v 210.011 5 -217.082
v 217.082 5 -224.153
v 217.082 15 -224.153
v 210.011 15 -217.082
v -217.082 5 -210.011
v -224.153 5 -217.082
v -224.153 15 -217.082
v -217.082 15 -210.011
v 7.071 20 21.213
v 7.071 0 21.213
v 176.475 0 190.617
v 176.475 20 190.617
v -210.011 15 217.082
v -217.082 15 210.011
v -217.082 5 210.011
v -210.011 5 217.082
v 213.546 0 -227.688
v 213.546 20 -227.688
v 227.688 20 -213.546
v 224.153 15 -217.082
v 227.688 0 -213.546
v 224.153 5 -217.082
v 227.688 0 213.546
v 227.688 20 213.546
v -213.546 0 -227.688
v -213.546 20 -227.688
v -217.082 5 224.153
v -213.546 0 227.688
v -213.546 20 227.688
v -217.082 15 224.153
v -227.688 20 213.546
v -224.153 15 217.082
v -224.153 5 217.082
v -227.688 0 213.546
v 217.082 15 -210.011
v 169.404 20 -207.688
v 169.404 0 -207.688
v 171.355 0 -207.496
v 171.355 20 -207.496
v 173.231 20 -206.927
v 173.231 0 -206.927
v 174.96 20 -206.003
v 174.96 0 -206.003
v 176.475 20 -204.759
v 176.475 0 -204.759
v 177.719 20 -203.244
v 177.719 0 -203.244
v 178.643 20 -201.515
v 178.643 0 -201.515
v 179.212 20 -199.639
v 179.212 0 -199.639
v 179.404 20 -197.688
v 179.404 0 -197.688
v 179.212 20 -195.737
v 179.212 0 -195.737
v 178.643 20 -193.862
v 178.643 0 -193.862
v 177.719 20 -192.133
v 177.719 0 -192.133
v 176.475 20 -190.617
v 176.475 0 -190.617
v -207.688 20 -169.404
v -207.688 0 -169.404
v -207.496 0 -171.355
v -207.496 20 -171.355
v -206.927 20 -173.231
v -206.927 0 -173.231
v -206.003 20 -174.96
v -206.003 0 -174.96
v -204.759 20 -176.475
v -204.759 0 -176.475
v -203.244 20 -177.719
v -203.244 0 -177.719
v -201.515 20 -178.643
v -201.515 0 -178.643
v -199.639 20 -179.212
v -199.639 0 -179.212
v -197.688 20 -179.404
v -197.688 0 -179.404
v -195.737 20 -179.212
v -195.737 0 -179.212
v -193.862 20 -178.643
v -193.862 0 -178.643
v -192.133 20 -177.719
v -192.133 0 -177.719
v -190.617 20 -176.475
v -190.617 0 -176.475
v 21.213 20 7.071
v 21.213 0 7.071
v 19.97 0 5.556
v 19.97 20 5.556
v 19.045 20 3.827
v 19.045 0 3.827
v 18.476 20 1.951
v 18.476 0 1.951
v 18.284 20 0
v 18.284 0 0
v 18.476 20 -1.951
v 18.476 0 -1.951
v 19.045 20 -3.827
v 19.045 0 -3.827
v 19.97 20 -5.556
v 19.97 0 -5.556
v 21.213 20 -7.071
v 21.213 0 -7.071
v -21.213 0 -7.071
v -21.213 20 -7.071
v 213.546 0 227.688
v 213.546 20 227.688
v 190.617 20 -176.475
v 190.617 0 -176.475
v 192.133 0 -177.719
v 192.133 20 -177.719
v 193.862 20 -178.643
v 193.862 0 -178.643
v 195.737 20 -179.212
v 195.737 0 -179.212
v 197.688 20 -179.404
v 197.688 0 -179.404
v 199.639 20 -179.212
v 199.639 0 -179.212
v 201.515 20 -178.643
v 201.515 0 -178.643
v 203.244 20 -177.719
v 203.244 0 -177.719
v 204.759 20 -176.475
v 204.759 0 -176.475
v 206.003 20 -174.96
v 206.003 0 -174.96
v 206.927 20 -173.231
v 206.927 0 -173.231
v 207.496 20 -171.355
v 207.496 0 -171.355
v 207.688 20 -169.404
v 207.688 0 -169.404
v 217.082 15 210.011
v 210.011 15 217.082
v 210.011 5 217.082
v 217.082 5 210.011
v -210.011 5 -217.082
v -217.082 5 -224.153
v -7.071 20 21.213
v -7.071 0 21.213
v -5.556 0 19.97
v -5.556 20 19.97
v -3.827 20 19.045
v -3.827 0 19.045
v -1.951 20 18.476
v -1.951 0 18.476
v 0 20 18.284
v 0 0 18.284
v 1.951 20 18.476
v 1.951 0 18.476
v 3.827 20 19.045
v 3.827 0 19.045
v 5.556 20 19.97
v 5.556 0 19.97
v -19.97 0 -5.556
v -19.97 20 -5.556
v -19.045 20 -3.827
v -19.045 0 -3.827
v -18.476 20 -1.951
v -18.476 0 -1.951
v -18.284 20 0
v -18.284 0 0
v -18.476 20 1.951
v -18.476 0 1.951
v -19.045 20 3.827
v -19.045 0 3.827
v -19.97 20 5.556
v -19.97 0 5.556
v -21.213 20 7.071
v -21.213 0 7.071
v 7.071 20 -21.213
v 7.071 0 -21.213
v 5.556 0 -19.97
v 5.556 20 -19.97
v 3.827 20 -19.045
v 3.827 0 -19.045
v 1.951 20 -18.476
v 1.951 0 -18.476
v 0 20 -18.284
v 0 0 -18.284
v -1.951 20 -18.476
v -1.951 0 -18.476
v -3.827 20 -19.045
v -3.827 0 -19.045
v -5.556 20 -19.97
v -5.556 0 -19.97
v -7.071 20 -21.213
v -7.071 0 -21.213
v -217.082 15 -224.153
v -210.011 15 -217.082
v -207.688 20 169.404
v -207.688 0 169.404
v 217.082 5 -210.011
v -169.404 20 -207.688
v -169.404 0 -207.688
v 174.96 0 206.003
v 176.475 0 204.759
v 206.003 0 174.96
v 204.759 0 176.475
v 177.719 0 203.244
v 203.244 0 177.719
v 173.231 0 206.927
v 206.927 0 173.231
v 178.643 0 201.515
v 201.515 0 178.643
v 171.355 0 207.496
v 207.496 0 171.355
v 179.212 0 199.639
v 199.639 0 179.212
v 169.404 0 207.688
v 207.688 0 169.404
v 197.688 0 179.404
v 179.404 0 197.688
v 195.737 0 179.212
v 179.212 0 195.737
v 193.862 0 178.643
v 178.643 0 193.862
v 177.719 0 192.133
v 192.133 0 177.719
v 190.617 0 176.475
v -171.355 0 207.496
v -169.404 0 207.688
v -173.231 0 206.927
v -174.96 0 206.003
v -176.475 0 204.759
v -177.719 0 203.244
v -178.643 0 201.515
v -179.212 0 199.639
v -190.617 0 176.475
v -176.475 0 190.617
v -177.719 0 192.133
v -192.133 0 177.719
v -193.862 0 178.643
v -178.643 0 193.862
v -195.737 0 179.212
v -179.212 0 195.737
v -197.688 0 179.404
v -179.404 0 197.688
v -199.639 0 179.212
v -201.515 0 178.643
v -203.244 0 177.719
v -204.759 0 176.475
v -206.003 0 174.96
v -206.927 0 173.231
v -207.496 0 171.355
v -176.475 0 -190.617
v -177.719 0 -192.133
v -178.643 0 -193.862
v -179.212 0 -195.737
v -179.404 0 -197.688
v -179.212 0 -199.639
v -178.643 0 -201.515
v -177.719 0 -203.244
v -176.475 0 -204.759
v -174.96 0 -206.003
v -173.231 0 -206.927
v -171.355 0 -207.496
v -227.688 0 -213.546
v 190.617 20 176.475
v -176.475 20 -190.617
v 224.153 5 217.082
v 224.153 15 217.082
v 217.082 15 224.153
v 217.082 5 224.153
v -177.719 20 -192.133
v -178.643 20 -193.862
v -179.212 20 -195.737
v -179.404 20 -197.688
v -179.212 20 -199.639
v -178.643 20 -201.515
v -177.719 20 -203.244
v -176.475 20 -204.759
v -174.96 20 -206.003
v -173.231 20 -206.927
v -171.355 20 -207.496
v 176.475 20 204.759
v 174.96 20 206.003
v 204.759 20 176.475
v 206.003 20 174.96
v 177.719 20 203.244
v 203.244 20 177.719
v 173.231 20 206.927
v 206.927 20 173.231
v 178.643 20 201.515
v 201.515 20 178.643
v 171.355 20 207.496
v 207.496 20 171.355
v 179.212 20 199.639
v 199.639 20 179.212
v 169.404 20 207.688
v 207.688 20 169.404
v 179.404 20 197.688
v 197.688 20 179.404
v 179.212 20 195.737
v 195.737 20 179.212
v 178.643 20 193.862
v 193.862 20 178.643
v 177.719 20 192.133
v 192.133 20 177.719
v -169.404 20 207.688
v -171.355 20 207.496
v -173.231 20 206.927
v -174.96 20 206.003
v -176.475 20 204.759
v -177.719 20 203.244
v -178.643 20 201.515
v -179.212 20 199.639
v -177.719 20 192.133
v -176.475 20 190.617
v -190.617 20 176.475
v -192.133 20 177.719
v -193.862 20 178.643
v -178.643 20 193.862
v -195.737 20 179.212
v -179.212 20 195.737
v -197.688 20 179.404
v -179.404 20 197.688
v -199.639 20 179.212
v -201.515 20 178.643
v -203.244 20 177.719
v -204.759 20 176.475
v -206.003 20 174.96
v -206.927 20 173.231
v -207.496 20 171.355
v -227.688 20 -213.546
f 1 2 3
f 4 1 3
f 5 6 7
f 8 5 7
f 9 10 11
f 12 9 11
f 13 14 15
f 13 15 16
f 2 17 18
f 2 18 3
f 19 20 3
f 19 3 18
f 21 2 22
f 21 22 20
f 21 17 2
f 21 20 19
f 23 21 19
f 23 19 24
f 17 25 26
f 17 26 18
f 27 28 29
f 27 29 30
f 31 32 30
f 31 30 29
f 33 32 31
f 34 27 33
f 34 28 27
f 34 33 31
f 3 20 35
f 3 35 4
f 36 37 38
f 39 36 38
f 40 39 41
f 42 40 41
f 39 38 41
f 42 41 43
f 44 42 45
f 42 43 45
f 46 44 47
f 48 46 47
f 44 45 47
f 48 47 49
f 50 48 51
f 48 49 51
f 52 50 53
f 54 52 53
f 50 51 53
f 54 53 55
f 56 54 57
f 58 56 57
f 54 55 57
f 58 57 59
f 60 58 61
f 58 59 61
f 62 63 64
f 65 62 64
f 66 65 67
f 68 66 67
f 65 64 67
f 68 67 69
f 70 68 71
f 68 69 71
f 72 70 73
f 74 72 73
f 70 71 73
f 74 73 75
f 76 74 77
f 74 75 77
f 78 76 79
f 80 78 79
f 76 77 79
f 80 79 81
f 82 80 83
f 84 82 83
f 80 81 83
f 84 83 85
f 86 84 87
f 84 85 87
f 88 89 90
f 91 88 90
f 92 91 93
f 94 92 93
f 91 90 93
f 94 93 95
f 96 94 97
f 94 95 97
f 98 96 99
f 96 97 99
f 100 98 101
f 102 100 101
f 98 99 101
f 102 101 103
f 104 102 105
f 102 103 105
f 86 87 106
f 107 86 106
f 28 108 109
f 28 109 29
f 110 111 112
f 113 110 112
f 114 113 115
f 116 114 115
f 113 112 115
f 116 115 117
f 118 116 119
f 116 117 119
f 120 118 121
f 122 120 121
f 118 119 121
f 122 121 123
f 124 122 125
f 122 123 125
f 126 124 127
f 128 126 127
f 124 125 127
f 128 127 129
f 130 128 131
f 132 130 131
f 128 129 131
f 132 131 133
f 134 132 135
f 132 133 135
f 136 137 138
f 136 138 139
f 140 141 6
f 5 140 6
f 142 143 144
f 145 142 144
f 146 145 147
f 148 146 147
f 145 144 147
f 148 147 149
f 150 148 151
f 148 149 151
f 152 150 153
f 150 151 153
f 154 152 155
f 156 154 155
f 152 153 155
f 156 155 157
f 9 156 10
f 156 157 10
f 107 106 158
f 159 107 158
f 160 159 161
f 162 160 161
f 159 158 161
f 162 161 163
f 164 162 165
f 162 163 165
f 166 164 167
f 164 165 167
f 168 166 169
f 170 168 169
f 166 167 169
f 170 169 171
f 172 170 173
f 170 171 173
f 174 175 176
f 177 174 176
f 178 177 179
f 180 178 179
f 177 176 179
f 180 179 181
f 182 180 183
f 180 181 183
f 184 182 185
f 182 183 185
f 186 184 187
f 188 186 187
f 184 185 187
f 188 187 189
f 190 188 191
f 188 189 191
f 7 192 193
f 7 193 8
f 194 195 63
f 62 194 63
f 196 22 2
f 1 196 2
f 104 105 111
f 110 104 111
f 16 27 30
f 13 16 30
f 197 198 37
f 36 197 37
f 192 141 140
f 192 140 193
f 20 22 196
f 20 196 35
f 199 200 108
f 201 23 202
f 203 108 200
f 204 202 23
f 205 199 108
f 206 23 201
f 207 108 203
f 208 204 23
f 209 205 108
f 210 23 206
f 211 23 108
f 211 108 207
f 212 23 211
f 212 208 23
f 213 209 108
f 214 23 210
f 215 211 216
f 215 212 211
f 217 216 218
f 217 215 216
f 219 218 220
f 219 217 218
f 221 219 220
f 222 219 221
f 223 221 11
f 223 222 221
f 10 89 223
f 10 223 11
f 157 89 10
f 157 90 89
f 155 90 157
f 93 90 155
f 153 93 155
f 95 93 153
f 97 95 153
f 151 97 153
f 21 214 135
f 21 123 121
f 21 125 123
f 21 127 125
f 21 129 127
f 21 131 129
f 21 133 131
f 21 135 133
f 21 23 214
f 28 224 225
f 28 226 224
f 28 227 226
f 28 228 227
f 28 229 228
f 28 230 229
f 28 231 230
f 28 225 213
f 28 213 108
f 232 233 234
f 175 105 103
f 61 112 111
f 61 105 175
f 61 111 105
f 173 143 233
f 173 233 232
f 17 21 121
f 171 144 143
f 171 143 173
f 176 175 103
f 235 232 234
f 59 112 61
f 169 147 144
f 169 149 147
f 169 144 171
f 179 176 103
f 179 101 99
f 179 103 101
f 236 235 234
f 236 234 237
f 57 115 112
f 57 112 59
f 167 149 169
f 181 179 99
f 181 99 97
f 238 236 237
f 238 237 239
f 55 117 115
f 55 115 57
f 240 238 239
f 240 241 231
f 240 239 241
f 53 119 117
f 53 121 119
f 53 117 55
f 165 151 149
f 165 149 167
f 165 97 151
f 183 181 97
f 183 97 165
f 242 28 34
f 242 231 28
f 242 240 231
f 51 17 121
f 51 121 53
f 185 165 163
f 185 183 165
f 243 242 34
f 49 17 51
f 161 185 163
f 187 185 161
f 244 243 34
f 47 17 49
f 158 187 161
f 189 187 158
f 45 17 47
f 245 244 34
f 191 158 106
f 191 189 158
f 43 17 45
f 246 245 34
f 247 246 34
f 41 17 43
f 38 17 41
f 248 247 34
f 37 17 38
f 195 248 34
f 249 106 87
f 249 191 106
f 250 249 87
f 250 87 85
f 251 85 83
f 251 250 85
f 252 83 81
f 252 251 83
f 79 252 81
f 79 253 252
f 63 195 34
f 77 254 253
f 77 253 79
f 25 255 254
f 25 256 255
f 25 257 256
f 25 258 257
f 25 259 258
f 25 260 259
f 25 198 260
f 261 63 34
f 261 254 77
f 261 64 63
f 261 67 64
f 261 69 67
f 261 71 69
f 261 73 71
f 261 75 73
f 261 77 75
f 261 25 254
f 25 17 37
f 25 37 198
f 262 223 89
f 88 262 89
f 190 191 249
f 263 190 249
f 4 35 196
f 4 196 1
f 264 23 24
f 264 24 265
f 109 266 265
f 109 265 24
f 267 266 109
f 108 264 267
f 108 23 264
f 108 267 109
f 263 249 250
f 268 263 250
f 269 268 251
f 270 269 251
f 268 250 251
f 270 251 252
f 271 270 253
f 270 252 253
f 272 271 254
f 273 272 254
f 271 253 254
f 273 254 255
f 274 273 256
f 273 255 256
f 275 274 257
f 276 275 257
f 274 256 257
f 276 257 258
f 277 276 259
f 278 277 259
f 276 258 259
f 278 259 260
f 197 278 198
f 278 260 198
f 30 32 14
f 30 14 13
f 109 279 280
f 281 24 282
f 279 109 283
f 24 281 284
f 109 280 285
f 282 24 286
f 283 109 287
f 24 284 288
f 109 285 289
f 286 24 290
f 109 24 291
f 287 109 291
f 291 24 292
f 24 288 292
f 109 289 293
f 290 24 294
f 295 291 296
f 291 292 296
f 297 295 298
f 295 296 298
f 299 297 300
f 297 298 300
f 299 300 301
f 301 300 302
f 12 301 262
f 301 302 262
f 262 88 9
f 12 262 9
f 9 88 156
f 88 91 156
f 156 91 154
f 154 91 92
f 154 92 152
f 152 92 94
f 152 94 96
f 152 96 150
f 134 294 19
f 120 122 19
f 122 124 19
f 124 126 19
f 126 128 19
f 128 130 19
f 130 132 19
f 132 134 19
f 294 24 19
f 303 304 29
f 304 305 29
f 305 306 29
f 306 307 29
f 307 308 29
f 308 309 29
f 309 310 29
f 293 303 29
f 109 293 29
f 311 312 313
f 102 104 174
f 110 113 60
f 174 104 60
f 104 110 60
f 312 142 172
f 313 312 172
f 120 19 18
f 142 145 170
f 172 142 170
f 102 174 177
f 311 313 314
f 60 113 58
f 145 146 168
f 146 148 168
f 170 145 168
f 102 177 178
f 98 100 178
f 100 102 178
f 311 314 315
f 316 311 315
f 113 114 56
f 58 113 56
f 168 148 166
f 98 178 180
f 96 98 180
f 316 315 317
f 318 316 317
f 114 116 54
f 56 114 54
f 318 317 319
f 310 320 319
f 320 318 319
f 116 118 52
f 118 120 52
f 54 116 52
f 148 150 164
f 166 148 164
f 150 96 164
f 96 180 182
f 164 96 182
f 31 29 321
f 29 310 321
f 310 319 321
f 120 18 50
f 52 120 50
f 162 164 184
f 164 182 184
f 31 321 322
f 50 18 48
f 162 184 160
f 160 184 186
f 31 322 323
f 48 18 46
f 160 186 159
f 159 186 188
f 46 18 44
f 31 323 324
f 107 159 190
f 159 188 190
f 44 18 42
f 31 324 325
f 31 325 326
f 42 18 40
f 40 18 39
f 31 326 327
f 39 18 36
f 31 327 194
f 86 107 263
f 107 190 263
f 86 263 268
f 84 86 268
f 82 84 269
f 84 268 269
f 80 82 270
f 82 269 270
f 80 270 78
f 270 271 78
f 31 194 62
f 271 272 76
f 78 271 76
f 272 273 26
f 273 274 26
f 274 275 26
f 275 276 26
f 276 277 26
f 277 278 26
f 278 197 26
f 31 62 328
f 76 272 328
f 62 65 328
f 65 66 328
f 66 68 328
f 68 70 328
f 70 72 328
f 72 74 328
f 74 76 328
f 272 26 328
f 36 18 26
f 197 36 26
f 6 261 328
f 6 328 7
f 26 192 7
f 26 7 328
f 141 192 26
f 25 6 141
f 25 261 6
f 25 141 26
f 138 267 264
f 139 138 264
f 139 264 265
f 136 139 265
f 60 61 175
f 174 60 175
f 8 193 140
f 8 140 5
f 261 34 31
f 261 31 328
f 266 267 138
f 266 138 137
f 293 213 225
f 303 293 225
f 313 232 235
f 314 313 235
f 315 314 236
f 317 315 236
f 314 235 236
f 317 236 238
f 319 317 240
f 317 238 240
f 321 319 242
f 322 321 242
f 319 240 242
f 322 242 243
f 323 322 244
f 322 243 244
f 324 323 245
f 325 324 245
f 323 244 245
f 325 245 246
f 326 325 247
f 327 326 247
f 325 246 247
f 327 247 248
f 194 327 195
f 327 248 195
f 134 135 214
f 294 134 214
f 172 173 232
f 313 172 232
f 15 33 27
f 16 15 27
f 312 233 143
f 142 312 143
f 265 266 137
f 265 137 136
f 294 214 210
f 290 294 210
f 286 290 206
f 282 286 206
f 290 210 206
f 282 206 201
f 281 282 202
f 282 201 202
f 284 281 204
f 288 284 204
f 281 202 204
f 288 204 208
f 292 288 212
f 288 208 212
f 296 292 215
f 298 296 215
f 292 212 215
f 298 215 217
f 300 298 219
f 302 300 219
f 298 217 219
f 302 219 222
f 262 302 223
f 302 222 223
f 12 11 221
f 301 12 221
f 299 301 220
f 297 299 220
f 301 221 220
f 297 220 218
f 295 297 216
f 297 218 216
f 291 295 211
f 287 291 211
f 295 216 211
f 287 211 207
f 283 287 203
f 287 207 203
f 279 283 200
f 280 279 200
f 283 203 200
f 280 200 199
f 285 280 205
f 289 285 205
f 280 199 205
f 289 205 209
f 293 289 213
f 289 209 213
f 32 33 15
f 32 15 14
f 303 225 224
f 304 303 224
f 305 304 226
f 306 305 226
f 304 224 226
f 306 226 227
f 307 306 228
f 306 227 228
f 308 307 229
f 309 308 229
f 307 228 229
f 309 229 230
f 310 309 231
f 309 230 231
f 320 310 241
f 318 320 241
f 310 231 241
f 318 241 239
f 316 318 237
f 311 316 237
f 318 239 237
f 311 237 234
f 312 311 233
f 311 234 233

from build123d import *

# Parameters (mm, degrees)
BOSS_EXTRUDE1_DEPTH = 20
SKETCH3_W           = 10
SKETCH3_H           = 10
CUT_EXTRUDE1_DEPTH  = 10
CIRPATTERN1_COUNT   = 4


with BuildPart() as part:
    # Sketch1 → Boss-Extrude1 (new body)
    with BuildSketch(Plane(origin=(0, 0, 0), x_dir=(1, 0, 0), z_dir=(0, 1, 0))):
        Polygon((213.546247918, 227.688383542), (227.688383542, 213.546247918), (227.688383542, -213.546247918), (213.546247918, -227.688383542), (-213.546247918, -227.688383542), (-227.688383542, -213.546247918), (-227.688383542, 213.546247918), (-213.546247918, 227.688383542), align=None)
        with BuildLine():
            Line((21.213203436, 7.071067812), (190.61731573, 176.475180106))
            ThreePointArc((190.61731573, 176.475180106), (201.515217866, 178.64290762), (207.688383542, 169.404112295))
            Line((207.688383542, 169.404112295), (207.688383542, -169.404112295))
            ThreePointArc((207.688383542, -169.404112295), (201.515217866, -178.64290762), (190.61731573, -176.475180106))
            Line((190.61731573, -176.475180106), (21.213203436, -7.071067812))
            ThreePointArc((21.213203436, -7.071067812), (18.284271247, 0), (21.213203436, 7.071067812))
        make_face(mode=Mode.SUBTRACT)
        with BuildLine():
            Line((7.071067812, -21.213203436), (176.475180106, -190.61731573))
            ThreePointArc((176.475180106, -190.61731573), (178.64290762, -201.515217866), (169.404112295, -207.688383542))
            Line((169.404112295, -207.688383542), (-169.404112295, -207.688383542))
            ThreePointArc((-169.404112295, -207.688383542), (-178.64290762, -201.515217866), (-176.475180106, -190.61731573))
            Line((-176.475180106, -190.61731573), (-7.071067812, -21.213203436))
            ThreePointArc((-7.071067812, -21.213203436), (0, -18.284271247), (7.071067812, -21.213203436))
        make_face(mode=Mode.SUBTRACT)
        with BuildLine():
            Line((-21.213203436, -7.071067812), (-190.61731573, -176.475180106))
            ThreePointArc((-190.61731573, -176.475180106), (-201.515217866, -178.64290762), (-207.688383542, -169.404112295))
            Line((-207.688383542, -169.404112295), (-207.688383542, 169.404112295))
            ThreePointArc((-207.688383542, 169.404112295), (-201.515217866, 178.64290762), (-190.61731573, 176.475180106))
            Line((-190.61731573, 176.475180106), (-21.213203436, 7.071067812))
            ThreePointArc((-21.213203436, 7.071067812), (-18.284271247, 0), (-21.213203436, -7.071067812))
        make_face(mode=Mode.SUBTRACT)
        with BuildLine():
            Line((-7.071067812, 21.213203436), (-176.475180106, 190.61731573))
            ThreePointArc((-176.475180106, 190.61731573), (-178.64290762, 201.515217866), (-169.404112295, 207.688383542))
            Line((-169.404112295, 207.688383542), (169.404112295, 207.688383542))
            ThreePointArc((169.404112295, 207.688383542), (178.64290762, 201.515217866), (176.475180106, 190.61731573))
            Line((176.475180106, 190.61731573), (7.071067812, 21.213203436))
            ThreePointArc((7.071067812, 21.213203436), (0, 18.284271247), (-7.071067812, 21.213203436))
        make_face(mode=Mode.SUBTRACT)
    extrude(amount=BOSS_EXTRUDE1_DEPTH)

    # Sketch3 → Cut-Extrude1 (cut)
    with BuildSketch(Plane(origin=(220.61731573, 0, -220.61731573), x_dir=(-0.7071067811865545, 0, -0.7071067811865407), z_dir=(0.7071067811865407, 0, -0.7071067811865545))):
        with Locations((0, 10)):
            Rectangle(SKETCH3_W, SKETCH3_H)
    cut_extrude1 = extrude(amount=-CUT_EXTRUDE1_DEPTH, mode=Mode.SUBTRACT)

    # CirPattern1: Cut-Extrude1 ×4 about axis
    cirpattern1_axis = Axis((0, -1, 0), (0, 1, 0))
    for i in range(1, CIRPATTERN1_COUNT):
        add(cut_extrude1.rotate(cirpattern1_axis, i * 360 / CIRPATTERN1_COUNT), mode=Mode.SUBTRACT)


solid = part.part
